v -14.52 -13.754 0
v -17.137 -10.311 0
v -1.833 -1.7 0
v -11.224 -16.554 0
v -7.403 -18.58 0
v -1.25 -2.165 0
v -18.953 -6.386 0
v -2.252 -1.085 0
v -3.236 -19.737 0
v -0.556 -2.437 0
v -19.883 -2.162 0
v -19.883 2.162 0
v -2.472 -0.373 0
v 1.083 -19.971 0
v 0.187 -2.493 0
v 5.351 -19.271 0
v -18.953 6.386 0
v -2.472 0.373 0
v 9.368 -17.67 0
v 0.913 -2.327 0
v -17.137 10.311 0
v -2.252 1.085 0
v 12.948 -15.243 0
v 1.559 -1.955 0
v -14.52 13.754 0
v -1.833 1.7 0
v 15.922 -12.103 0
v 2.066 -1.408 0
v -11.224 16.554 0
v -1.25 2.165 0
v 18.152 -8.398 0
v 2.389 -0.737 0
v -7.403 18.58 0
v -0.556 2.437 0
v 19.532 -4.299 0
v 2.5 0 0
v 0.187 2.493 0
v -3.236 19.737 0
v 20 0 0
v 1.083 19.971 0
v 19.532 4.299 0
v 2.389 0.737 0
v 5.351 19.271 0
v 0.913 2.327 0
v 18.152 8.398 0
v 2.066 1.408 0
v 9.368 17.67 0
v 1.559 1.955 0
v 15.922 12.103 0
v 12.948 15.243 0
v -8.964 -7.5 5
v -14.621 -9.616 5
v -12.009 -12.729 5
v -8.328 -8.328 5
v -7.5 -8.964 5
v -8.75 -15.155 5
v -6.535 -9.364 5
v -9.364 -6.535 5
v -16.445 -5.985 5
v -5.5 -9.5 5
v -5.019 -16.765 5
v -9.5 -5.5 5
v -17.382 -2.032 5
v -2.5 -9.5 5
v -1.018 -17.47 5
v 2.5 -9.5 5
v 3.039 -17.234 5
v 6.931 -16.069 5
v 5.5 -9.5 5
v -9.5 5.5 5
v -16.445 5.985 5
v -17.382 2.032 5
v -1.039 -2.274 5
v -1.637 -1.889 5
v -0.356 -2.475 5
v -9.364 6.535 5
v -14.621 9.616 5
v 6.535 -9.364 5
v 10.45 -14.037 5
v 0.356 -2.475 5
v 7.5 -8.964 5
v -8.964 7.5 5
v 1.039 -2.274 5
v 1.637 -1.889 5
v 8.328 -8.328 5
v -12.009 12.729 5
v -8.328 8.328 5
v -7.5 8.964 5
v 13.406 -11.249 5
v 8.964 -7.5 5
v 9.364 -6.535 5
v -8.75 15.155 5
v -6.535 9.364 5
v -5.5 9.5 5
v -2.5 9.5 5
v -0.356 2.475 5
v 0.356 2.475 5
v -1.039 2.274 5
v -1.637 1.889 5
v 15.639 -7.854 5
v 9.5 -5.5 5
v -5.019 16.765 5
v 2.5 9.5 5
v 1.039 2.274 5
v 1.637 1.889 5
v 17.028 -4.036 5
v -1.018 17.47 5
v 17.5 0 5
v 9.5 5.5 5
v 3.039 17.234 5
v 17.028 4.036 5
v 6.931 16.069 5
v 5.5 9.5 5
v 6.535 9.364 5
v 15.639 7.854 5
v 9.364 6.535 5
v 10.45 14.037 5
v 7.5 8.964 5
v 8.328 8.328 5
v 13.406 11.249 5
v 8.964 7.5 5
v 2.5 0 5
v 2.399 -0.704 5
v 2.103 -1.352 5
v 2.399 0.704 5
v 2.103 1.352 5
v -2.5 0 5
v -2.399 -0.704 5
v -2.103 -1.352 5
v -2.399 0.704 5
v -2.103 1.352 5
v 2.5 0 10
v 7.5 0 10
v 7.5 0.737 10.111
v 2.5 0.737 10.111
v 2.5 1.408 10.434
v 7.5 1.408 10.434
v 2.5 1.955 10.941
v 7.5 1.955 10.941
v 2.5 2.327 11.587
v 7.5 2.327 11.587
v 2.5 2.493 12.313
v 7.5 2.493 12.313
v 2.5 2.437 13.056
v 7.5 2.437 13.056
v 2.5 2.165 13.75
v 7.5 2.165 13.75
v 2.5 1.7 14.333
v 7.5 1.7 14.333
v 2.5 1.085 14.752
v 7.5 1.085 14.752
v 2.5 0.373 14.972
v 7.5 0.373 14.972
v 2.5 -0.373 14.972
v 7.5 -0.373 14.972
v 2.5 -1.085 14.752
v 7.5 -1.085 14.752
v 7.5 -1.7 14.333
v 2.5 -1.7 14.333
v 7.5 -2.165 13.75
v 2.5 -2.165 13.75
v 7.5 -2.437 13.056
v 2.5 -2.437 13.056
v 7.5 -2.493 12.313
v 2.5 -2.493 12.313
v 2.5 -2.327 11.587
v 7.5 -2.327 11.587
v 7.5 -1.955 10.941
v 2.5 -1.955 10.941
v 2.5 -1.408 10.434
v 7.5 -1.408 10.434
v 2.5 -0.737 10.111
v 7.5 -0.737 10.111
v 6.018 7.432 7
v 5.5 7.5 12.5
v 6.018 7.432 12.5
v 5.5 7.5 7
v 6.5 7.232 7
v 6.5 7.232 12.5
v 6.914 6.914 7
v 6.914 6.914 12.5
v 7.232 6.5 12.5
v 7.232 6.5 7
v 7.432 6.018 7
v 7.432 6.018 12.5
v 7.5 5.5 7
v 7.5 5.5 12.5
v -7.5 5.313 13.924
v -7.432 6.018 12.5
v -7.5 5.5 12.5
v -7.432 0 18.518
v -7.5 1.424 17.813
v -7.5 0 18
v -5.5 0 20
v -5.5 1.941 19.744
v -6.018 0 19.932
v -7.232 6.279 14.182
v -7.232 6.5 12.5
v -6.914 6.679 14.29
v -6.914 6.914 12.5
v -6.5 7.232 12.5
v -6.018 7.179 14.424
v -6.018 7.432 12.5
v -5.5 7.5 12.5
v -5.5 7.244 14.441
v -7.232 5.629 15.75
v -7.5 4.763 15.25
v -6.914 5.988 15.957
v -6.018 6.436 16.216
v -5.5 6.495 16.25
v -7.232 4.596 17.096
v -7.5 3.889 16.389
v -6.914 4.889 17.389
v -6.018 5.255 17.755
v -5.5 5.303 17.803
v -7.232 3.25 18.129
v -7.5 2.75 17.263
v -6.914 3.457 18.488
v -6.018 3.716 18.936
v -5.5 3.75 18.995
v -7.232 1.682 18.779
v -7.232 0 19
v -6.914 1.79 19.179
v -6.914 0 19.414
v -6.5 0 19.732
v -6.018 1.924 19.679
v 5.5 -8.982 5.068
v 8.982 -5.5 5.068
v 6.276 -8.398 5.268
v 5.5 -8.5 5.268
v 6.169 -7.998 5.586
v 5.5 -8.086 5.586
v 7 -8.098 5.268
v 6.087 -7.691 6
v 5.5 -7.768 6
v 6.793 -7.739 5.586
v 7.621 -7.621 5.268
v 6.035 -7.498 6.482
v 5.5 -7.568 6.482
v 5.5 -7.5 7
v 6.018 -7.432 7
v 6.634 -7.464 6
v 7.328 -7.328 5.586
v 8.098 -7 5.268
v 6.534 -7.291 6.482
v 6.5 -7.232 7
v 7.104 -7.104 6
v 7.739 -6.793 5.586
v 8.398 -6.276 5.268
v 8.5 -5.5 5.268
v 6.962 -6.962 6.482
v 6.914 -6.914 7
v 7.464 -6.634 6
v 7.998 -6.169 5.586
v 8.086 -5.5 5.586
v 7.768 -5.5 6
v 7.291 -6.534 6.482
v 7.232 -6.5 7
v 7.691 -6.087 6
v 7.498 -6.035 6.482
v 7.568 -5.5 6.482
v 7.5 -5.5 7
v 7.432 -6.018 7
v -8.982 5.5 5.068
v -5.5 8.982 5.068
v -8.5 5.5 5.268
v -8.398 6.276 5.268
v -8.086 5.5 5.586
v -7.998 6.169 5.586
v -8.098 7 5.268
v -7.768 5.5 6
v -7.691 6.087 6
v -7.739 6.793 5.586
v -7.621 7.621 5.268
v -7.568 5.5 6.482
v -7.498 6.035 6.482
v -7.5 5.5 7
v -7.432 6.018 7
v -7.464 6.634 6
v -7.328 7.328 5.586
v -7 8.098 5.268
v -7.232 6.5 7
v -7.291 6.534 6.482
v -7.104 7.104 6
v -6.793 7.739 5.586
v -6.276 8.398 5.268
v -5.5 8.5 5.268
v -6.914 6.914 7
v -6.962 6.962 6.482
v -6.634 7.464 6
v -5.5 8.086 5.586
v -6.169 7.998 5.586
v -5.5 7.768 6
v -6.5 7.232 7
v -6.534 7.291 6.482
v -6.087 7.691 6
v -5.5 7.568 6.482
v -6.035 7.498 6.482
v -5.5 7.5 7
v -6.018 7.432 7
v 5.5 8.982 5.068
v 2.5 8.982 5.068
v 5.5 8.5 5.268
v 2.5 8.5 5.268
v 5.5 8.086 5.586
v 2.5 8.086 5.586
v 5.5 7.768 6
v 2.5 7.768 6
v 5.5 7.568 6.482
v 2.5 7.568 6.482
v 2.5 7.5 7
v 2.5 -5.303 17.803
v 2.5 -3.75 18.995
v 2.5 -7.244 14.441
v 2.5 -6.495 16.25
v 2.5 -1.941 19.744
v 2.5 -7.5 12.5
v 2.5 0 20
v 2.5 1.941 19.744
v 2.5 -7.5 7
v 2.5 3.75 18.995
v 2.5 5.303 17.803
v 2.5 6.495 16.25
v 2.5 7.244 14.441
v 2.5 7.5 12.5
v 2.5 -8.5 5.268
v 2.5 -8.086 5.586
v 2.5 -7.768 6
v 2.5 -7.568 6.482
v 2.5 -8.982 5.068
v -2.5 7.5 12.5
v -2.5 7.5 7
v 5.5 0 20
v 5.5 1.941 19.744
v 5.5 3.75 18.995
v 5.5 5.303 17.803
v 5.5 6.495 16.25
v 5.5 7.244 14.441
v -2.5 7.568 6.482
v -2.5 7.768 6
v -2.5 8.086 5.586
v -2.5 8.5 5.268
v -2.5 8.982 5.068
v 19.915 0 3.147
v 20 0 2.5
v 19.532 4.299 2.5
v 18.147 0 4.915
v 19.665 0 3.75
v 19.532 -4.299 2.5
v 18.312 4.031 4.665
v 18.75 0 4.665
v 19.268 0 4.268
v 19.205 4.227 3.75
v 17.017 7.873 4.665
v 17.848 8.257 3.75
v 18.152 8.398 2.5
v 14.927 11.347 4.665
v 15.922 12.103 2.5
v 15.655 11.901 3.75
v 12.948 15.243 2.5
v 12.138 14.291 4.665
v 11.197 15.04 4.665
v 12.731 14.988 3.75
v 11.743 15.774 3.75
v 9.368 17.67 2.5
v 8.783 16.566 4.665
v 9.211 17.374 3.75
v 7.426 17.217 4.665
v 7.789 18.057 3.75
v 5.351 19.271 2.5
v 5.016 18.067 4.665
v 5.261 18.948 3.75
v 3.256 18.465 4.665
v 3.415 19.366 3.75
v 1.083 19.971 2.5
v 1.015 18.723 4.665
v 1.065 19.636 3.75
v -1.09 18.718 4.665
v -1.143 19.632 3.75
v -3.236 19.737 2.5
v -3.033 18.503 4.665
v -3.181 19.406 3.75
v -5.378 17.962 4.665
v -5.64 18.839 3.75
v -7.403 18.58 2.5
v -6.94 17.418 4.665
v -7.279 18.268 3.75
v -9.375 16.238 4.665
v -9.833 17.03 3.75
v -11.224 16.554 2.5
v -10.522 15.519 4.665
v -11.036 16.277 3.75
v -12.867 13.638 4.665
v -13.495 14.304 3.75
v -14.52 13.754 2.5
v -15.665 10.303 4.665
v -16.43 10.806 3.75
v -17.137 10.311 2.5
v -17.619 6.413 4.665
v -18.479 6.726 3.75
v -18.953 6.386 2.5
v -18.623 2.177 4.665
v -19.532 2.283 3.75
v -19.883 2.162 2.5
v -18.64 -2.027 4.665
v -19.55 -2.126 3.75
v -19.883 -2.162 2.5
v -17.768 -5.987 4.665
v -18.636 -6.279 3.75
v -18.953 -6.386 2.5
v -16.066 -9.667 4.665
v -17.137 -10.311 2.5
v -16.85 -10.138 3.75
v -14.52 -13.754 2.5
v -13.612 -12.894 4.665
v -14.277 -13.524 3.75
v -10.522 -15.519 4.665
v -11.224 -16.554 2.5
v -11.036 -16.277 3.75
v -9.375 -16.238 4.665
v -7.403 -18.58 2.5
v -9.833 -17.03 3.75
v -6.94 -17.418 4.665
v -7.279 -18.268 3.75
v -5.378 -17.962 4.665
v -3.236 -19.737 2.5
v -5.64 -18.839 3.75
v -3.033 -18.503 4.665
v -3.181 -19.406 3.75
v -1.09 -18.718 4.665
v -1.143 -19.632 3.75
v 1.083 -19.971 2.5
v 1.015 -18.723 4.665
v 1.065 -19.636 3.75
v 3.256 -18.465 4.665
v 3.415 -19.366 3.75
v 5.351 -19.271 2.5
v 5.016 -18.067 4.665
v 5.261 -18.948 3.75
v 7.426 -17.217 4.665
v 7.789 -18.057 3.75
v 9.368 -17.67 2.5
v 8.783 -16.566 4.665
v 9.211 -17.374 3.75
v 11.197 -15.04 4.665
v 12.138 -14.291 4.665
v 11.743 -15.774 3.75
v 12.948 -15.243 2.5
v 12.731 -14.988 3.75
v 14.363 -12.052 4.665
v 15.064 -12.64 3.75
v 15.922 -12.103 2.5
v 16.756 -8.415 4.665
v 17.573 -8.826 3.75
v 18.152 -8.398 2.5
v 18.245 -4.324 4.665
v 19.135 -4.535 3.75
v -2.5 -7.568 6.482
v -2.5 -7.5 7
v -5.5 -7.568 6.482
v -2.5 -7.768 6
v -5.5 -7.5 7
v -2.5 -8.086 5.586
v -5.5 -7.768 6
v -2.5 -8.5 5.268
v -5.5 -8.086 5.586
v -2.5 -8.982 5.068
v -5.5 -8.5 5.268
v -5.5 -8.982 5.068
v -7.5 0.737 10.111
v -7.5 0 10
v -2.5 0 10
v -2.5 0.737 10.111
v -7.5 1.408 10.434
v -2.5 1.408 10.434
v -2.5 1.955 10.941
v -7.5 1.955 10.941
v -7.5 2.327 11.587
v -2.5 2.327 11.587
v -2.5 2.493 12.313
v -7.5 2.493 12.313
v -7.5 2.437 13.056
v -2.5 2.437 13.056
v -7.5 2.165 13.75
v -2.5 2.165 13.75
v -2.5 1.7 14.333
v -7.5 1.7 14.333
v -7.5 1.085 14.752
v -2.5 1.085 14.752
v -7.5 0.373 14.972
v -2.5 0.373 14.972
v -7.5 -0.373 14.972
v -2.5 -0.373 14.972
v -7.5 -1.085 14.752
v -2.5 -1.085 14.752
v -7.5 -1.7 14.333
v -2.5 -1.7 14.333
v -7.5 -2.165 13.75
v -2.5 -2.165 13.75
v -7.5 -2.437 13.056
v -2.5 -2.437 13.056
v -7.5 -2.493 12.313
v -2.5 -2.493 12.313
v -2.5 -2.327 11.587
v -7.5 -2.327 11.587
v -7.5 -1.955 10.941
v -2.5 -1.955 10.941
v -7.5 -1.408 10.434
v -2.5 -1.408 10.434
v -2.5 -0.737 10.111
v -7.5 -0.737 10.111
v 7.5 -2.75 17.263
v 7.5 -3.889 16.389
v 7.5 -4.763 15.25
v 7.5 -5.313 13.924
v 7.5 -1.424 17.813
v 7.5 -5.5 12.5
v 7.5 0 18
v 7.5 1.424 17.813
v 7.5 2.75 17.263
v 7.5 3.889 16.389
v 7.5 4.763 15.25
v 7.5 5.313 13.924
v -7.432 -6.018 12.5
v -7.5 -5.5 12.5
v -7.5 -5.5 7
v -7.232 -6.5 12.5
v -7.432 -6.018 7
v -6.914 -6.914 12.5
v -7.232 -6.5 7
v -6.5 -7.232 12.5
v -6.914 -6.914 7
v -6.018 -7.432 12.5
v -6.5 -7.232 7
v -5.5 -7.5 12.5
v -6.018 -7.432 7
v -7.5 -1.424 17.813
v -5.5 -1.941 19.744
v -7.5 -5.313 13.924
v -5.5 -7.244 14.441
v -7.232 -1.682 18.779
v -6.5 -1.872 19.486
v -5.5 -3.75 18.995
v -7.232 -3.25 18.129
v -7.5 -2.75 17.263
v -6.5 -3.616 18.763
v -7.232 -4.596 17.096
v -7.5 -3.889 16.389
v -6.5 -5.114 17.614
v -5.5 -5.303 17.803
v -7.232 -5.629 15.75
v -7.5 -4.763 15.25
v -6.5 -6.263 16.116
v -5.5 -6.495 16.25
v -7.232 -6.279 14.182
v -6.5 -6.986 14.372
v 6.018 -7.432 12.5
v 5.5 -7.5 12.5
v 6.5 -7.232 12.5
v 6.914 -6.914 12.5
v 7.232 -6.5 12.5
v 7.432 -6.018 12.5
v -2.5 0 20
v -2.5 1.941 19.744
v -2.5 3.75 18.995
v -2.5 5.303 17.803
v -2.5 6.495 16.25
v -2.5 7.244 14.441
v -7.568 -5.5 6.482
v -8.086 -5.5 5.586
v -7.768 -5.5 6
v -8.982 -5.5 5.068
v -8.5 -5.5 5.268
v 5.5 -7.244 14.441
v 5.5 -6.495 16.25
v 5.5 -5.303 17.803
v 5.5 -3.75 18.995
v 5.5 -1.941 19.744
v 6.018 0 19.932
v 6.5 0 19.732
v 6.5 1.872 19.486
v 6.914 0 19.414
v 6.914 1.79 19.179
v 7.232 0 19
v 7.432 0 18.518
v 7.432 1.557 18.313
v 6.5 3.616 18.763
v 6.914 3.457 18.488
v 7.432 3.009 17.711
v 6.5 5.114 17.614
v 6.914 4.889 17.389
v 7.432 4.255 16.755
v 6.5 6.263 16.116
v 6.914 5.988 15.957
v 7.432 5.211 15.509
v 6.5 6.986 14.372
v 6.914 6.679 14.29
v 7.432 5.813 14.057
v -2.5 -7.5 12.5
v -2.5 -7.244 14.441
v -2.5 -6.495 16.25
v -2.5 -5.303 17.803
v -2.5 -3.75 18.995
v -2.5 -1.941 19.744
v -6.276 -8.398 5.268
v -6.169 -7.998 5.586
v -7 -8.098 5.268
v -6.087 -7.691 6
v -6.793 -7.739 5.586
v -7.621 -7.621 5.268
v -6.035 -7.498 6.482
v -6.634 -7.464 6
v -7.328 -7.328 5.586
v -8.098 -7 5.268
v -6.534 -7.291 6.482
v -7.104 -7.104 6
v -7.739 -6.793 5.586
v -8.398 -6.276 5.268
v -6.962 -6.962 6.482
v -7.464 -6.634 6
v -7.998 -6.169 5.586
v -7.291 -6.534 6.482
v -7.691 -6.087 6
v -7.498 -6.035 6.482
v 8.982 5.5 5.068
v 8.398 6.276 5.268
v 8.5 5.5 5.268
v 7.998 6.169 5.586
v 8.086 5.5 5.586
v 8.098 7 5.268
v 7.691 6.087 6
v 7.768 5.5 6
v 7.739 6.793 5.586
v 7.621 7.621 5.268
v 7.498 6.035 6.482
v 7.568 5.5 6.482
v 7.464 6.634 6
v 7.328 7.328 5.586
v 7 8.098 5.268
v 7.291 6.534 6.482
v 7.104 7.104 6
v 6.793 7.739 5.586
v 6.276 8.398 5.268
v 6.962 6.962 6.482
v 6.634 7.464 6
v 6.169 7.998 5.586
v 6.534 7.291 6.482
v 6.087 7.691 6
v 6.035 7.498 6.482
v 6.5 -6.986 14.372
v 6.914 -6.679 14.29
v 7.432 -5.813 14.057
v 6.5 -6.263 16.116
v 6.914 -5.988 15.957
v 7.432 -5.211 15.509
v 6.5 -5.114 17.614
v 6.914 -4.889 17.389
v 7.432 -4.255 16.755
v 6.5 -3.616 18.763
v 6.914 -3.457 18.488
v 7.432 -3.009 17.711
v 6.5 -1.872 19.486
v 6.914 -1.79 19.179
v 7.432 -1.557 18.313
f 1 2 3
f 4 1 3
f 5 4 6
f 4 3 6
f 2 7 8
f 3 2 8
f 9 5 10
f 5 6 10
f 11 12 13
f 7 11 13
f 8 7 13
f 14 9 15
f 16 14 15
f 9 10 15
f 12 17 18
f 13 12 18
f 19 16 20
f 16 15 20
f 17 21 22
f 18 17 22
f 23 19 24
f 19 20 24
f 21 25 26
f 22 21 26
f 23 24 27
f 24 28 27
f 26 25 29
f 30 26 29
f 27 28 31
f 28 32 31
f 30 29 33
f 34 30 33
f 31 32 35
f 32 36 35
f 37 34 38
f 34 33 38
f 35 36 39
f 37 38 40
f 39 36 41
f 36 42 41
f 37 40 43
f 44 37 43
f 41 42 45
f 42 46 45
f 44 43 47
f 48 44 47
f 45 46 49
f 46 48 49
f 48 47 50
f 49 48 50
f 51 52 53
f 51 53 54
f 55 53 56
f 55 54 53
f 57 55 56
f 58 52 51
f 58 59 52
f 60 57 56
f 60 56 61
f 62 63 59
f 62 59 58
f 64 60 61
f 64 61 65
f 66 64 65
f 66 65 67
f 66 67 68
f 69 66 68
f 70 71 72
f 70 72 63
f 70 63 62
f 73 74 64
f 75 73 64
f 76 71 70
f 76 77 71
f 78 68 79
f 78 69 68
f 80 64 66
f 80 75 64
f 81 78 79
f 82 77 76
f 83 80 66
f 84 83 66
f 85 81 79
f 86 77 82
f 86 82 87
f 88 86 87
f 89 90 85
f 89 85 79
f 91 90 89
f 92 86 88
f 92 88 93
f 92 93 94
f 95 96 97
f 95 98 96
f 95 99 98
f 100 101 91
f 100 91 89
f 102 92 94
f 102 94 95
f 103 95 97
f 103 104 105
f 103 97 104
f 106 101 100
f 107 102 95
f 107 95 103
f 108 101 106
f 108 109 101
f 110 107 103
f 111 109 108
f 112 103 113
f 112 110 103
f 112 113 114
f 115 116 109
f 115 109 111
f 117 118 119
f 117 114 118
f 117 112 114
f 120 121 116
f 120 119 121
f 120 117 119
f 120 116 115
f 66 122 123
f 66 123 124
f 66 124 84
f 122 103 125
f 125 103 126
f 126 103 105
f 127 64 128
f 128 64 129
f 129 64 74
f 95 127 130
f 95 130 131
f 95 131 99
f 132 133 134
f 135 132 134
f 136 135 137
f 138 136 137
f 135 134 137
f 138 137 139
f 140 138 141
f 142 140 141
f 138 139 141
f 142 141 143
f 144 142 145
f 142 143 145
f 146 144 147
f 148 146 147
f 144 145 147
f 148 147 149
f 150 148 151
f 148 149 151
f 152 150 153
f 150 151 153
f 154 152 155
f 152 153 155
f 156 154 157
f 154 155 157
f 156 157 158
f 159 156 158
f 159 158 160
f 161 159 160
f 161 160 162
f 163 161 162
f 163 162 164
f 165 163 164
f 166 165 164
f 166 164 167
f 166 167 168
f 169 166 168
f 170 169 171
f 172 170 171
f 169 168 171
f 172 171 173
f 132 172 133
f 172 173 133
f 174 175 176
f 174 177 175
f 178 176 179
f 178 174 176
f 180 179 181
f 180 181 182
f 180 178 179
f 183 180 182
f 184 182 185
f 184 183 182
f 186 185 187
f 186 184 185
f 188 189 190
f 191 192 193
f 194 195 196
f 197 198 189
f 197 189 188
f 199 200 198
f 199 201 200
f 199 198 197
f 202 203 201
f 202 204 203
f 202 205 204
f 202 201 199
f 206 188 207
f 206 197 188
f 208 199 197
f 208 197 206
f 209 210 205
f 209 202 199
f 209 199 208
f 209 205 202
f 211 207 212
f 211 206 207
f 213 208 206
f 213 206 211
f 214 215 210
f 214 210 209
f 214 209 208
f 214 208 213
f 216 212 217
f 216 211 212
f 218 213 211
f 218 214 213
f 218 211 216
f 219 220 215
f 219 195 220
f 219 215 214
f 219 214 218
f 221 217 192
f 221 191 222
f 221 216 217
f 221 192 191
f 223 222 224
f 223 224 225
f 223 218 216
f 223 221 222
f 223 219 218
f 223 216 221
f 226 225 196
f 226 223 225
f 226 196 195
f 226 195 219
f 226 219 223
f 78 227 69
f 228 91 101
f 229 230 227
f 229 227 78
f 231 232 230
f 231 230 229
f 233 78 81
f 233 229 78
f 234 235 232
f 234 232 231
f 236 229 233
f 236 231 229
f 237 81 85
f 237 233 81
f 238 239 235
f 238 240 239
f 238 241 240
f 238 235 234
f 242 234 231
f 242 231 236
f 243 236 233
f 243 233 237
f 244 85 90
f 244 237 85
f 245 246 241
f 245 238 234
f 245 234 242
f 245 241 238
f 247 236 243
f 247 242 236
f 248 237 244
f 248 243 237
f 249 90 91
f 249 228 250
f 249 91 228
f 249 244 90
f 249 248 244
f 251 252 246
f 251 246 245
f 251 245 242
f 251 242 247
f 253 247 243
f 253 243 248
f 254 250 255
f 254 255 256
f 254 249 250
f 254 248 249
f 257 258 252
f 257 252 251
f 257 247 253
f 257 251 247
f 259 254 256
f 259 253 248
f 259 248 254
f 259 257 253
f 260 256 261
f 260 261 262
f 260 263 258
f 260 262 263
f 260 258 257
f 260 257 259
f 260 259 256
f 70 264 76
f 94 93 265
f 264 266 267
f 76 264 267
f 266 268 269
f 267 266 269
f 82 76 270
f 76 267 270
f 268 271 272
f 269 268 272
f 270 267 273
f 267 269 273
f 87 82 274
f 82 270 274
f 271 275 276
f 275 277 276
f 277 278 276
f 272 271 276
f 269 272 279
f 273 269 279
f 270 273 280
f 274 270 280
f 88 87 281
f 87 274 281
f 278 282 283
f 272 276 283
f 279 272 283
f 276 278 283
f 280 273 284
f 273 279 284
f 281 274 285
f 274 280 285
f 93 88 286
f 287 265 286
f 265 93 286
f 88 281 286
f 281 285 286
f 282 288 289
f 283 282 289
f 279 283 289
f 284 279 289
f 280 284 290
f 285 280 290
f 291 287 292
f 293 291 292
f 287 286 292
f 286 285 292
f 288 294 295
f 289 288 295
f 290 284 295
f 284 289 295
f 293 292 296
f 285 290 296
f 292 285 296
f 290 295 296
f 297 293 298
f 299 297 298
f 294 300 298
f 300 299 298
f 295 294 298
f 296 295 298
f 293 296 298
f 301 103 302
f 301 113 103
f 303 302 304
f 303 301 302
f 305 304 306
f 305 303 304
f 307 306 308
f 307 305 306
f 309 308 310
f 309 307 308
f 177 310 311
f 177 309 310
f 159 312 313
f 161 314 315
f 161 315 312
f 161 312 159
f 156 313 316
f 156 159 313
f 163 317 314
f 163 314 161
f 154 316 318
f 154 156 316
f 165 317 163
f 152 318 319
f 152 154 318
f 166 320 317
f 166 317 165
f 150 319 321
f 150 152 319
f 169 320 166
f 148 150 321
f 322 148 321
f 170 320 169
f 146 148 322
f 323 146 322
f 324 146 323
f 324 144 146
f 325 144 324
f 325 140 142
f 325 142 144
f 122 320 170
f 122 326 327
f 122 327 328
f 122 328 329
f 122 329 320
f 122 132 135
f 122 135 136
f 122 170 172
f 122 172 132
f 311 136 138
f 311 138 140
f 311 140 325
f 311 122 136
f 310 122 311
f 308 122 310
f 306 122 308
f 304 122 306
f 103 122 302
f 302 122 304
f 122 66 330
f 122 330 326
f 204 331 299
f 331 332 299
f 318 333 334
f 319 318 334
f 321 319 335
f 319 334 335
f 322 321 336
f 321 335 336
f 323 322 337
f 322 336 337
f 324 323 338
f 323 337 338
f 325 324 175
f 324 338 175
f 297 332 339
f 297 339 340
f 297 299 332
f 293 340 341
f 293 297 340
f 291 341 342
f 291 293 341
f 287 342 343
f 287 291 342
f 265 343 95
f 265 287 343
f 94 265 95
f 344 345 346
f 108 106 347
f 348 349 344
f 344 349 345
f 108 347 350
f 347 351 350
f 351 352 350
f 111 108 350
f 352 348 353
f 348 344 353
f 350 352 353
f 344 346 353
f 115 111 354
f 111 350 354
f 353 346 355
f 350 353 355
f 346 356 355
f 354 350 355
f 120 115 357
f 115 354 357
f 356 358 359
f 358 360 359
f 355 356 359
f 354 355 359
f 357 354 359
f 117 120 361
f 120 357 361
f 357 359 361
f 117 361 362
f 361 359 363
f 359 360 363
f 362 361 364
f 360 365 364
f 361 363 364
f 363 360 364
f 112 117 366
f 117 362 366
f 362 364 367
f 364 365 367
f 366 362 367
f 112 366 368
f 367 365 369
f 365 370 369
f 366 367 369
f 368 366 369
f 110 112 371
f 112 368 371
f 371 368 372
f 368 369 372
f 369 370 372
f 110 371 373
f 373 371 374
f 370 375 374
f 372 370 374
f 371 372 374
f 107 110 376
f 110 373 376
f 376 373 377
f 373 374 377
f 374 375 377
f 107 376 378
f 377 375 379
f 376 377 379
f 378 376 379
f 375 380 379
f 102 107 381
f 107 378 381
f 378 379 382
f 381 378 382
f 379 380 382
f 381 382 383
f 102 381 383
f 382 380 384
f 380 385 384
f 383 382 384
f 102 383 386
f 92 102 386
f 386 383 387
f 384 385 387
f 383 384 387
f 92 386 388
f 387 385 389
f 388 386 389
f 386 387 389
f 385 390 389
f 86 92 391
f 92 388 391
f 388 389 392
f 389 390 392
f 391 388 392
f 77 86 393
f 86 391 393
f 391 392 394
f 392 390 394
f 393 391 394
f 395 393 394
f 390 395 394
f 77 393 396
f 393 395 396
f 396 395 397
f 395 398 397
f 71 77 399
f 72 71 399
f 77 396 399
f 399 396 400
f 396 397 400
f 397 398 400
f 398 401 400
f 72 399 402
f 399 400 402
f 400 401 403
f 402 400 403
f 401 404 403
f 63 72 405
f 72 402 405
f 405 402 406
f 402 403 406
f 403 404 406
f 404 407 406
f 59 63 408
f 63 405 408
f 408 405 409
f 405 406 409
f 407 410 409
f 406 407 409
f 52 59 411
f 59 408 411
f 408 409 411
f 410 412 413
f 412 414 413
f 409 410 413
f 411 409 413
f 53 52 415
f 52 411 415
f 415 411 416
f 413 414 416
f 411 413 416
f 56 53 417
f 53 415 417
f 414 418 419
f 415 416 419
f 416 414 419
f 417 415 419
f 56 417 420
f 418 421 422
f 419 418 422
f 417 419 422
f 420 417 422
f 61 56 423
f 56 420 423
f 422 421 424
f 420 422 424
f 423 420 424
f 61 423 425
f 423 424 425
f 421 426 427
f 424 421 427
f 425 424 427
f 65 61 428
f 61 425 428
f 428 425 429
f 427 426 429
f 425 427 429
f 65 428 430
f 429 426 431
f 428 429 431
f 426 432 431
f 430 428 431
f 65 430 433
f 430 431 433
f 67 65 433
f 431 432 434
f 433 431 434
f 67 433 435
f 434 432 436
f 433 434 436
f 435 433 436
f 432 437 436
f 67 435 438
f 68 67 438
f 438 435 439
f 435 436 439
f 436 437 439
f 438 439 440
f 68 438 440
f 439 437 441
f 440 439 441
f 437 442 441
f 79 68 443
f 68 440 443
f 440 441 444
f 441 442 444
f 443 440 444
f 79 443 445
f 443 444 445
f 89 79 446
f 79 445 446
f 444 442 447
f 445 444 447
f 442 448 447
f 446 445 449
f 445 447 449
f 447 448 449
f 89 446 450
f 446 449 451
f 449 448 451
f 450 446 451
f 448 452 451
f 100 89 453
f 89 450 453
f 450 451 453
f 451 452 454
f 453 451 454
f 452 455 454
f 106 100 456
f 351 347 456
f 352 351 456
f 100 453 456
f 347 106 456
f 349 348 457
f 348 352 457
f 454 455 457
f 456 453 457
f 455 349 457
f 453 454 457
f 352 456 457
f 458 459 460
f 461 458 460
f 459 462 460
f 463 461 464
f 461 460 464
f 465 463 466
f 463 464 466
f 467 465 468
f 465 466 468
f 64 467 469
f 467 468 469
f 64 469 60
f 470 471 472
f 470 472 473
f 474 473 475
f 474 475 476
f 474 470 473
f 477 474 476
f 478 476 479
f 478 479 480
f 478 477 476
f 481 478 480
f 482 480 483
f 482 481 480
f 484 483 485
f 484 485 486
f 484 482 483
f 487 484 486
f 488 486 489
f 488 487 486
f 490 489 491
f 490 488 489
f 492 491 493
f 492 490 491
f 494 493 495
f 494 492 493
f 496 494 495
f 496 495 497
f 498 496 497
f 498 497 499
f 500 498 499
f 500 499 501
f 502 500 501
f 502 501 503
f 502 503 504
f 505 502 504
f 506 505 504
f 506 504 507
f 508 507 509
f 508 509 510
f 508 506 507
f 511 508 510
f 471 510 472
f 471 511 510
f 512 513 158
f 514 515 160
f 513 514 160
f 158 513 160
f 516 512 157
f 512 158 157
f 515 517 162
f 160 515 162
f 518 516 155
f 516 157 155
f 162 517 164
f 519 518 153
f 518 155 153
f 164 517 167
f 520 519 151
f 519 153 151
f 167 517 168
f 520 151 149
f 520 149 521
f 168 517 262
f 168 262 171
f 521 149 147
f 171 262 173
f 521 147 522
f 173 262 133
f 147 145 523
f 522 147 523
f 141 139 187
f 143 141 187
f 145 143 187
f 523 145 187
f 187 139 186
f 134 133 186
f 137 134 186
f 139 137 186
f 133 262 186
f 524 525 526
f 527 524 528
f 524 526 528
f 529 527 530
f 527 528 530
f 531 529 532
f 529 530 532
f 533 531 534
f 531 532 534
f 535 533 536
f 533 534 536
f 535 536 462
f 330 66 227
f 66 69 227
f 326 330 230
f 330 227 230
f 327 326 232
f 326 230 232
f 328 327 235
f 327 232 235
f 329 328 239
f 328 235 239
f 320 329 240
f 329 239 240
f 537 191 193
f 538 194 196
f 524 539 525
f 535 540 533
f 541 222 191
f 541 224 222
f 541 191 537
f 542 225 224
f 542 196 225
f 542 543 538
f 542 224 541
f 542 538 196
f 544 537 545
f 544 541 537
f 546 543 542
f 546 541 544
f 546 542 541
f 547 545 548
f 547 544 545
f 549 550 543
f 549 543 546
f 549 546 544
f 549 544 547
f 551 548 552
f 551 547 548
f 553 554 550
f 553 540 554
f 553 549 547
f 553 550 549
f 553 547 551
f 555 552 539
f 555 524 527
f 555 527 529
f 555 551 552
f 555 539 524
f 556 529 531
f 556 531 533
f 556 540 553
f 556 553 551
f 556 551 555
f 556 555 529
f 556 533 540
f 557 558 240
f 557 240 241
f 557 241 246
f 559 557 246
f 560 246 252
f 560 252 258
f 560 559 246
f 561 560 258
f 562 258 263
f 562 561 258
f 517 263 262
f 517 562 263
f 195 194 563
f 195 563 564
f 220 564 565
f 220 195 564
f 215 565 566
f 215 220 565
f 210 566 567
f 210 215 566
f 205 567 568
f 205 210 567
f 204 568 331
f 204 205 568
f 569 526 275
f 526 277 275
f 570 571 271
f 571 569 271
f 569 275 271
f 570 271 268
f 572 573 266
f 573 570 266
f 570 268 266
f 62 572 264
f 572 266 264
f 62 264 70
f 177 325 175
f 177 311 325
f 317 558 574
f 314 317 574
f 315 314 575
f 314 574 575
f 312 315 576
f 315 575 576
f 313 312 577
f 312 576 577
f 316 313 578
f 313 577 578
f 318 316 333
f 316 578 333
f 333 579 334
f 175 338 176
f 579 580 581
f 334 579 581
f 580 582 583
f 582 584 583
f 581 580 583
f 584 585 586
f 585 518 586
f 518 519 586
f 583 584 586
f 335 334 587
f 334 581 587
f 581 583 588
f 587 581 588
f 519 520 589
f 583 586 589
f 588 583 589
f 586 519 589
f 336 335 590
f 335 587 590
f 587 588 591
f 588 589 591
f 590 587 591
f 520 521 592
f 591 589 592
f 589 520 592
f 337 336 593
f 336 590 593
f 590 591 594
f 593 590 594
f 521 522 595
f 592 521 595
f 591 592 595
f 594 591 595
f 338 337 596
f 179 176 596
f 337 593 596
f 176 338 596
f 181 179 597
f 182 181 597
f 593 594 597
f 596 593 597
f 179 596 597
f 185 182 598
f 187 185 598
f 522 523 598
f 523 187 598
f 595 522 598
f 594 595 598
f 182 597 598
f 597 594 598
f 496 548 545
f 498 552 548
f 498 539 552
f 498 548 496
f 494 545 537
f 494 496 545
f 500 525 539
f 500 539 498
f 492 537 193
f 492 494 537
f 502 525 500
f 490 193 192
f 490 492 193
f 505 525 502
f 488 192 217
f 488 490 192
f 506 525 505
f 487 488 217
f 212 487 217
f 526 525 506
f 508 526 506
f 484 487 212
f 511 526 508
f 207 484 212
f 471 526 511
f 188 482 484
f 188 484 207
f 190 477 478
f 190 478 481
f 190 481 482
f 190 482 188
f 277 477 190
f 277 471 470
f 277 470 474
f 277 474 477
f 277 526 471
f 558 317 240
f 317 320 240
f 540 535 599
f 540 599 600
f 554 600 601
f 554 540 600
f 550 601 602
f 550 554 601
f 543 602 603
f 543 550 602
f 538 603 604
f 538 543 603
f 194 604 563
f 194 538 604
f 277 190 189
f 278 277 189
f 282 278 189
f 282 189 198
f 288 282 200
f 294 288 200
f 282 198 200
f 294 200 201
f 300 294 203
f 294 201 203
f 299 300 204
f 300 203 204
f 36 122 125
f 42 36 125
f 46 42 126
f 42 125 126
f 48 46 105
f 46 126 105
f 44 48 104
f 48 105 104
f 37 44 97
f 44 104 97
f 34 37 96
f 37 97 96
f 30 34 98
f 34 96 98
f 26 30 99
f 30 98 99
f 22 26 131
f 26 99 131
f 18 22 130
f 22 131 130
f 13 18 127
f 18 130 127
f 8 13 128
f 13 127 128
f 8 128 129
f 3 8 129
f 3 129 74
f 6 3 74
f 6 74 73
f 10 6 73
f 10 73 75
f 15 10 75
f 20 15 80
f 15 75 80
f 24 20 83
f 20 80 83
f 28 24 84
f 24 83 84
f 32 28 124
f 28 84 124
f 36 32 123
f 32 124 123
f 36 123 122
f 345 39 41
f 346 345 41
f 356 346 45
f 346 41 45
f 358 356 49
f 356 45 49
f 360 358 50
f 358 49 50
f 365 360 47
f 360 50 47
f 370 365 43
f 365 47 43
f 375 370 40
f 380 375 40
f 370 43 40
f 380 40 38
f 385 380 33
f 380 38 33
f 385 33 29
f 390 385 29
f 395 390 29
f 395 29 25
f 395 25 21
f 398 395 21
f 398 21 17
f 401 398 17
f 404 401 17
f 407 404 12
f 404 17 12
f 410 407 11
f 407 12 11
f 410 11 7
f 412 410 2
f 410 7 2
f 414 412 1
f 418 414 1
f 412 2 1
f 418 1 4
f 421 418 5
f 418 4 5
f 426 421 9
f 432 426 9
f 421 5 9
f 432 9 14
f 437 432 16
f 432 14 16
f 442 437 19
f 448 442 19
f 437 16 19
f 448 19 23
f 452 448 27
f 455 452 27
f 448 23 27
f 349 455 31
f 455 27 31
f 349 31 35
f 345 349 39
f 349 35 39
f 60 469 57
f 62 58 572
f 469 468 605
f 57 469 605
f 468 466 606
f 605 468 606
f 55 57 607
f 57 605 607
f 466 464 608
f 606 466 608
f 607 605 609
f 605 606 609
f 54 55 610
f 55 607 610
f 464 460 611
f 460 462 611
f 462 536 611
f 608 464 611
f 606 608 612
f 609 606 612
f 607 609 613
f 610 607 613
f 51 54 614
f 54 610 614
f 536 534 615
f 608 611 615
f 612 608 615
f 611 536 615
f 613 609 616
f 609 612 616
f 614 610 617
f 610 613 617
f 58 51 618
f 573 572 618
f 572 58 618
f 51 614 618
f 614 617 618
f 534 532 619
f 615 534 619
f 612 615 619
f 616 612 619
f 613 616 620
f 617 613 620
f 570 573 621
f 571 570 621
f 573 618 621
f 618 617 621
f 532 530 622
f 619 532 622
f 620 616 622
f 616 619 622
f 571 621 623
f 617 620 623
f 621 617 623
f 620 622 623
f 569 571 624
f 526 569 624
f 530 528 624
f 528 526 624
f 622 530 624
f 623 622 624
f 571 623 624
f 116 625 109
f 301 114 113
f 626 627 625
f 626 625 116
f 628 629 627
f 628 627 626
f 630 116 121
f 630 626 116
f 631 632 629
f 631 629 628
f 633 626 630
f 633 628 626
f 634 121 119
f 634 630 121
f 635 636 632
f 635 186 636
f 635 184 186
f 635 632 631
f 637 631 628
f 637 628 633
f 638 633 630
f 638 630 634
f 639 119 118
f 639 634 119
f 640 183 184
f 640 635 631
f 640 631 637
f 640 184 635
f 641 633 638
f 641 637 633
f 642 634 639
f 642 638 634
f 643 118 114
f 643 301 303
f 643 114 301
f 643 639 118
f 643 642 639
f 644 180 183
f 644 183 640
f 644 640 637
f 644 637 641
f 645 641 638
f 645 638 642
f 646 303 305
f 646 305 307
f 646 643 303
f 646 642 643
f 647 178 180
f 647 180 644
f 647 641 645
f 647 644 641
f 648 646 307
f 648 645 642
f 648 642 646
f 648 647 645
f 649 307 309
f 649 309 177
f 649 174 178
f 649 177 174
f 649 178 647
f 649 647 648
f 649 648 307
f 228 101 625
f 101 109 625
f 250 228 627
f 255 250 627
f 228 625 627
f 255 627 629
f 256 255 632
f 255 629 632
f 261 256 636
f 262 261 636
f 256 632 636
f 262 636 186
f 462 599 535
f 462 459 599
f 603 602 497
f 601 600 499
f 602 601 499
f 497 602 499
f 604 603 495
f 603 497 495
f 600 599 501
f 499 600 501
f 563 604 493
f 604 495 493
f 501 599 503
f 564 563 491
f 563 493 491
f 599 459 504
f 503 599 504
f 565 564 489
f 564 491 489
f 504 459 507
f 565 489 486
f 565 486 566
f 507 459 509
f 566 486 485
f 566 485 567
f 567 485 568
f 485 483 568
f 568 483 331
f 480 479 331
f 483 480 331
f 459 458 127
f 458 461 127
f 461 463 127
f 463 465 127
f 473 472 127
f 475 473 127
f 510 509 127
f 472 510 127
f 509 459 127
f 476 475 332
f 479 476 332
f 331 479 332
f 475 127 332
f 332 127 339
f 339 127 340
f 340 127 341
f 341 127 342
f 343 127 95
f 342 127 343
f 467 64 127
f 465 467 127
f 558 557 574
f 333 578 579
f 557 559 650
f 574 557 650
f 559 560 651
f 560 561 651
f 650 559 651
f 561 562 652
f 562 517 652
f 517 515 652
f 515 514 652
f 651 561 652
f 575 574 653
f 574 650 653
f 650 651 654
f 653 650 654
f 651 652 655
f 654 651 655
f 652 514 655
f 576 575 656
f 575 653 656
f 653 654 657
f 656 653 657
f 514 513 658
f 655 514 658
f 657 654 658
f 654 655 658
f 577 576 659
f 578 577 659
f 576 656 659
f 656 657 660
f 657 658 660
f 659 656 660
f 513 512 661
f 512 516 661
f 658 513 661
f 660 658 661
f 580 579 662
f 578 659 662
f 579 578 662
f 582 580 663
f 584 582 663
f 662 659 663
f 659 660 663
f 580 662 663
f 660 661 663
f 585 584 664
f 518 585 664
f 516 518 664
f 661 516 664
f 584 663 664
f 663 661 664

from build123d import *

# Parameters (mm, degrees)
CROQUIS1_R              = 20
SALIENTE_EXTRUIR1_DEPTH = 5
CROQUIS2_R              = 2.5
CORTAR_EXTRUIR1_DEPTH   = 5
CROQUIS3_W              = 5
CROQUIS3_H              = 15
SALIENTE_EXTRUIR3_DEPTH = 15
CROQUIS4_R              = 2.5
CORTAR_EXTRUIR2_DEPTH   = 5
FILLET1_R               = 2
FILLET2_R               = 2.5


with BuildPart() as part:
    # Croquis1 → Saliente-Extruir1 (new body)
    with BuildSketch(Plane.XY):
        Circle(CROQUIS1_R)
    extrude(amount=SALIENTE_EXTRUIR1_DEPTH)

    # Croquis2 → Cortar-Extruir1 (cut)
    with BuildSketch(Plane.XY.offset(5)):
        Circle(CROQUIS2_R)
    extrude(amount=-CORTAR_EXTRUIR1_DEPTH, mode=Mode.SUBTRACT)

    # Croquis3 → Saliente-Extruir3 (add)
    with BuildSketch(Plane.XY.offset(5)):
        with Locations((5, 0)):
            Rectangle(CROQUIS3_W, CROQUIS3_H)
    extrude(amount=SALIENTE_EXTRUIR3_DEPTH)

    # Croquis4 → Cortar-Extruir2 (cut)
    with BuildSketch(Plane(origin=(7.5, 0, 0), x_dir=(0, 0, -1), z_dir=(1, 0, 0))):
        with BuildLine():
            ThreePointArc((-12.5, -7.5), (-17.803300859, -5.303300859), (-20, 0))
            Line((-20, 0), (-20, -7.5))
            Line((-20, -7.5), (-12.5, -7.5))
        make_face()
        with BuildLine():
            ThreePointArc((-20, 0), (-17.803300859, 5.303300859), (-12.5, 7.5))
            Line((-12.5, 7.5), (-20, 7.5))
            Line((-20, 7.5), (-20, 0))
        make_face()
        with Locations((-12.5, 0)):
            Circle(CROQUIS4_R)
    extrude(amount=-CORTAR_EXTRUIR2_DEPTH, mode=Mode.SUBTRACT)

    # Simetría1: part across plane


with BuildPart() as part_1:
    add(part.part)
    add(part.part.mirror(Plane(origin=(0, 0, 0), x_dir=(0, 0, 1), z_dir=(1, 0, 0))))

    # Fillet1
    fillet1_edges = [part_1.edges().sort_by_distance(p)[0] for p in [
        (5, -7.5, 5),
        (7.5, 0, 5),
        (5, 7.5, 5),
        (7.5, -7.5, 8.75),
        (7.5, 0, 20),
        (7.5, 7.5, 8.75),
        (-5, -7.5, 5),
        (-7.5, 0, 5),
        (-5, 7.5, 5),
        (-7.5, 7.5, 8.75),
        (-7.5, -7.5, 8.75),
        (-7.5, 0, 20),
    ]]
    fillet(fillet1_edges, radius=FILLET1_R)

    # Fillet2
    fillet2_edges = [part_1.edges().sort_by_distance(p)[0] for p in [
        (-20, 0, 5),
    ]]
    fillet(fillet2_edges, radius=FILLET2_R)


solid = part_1.part
